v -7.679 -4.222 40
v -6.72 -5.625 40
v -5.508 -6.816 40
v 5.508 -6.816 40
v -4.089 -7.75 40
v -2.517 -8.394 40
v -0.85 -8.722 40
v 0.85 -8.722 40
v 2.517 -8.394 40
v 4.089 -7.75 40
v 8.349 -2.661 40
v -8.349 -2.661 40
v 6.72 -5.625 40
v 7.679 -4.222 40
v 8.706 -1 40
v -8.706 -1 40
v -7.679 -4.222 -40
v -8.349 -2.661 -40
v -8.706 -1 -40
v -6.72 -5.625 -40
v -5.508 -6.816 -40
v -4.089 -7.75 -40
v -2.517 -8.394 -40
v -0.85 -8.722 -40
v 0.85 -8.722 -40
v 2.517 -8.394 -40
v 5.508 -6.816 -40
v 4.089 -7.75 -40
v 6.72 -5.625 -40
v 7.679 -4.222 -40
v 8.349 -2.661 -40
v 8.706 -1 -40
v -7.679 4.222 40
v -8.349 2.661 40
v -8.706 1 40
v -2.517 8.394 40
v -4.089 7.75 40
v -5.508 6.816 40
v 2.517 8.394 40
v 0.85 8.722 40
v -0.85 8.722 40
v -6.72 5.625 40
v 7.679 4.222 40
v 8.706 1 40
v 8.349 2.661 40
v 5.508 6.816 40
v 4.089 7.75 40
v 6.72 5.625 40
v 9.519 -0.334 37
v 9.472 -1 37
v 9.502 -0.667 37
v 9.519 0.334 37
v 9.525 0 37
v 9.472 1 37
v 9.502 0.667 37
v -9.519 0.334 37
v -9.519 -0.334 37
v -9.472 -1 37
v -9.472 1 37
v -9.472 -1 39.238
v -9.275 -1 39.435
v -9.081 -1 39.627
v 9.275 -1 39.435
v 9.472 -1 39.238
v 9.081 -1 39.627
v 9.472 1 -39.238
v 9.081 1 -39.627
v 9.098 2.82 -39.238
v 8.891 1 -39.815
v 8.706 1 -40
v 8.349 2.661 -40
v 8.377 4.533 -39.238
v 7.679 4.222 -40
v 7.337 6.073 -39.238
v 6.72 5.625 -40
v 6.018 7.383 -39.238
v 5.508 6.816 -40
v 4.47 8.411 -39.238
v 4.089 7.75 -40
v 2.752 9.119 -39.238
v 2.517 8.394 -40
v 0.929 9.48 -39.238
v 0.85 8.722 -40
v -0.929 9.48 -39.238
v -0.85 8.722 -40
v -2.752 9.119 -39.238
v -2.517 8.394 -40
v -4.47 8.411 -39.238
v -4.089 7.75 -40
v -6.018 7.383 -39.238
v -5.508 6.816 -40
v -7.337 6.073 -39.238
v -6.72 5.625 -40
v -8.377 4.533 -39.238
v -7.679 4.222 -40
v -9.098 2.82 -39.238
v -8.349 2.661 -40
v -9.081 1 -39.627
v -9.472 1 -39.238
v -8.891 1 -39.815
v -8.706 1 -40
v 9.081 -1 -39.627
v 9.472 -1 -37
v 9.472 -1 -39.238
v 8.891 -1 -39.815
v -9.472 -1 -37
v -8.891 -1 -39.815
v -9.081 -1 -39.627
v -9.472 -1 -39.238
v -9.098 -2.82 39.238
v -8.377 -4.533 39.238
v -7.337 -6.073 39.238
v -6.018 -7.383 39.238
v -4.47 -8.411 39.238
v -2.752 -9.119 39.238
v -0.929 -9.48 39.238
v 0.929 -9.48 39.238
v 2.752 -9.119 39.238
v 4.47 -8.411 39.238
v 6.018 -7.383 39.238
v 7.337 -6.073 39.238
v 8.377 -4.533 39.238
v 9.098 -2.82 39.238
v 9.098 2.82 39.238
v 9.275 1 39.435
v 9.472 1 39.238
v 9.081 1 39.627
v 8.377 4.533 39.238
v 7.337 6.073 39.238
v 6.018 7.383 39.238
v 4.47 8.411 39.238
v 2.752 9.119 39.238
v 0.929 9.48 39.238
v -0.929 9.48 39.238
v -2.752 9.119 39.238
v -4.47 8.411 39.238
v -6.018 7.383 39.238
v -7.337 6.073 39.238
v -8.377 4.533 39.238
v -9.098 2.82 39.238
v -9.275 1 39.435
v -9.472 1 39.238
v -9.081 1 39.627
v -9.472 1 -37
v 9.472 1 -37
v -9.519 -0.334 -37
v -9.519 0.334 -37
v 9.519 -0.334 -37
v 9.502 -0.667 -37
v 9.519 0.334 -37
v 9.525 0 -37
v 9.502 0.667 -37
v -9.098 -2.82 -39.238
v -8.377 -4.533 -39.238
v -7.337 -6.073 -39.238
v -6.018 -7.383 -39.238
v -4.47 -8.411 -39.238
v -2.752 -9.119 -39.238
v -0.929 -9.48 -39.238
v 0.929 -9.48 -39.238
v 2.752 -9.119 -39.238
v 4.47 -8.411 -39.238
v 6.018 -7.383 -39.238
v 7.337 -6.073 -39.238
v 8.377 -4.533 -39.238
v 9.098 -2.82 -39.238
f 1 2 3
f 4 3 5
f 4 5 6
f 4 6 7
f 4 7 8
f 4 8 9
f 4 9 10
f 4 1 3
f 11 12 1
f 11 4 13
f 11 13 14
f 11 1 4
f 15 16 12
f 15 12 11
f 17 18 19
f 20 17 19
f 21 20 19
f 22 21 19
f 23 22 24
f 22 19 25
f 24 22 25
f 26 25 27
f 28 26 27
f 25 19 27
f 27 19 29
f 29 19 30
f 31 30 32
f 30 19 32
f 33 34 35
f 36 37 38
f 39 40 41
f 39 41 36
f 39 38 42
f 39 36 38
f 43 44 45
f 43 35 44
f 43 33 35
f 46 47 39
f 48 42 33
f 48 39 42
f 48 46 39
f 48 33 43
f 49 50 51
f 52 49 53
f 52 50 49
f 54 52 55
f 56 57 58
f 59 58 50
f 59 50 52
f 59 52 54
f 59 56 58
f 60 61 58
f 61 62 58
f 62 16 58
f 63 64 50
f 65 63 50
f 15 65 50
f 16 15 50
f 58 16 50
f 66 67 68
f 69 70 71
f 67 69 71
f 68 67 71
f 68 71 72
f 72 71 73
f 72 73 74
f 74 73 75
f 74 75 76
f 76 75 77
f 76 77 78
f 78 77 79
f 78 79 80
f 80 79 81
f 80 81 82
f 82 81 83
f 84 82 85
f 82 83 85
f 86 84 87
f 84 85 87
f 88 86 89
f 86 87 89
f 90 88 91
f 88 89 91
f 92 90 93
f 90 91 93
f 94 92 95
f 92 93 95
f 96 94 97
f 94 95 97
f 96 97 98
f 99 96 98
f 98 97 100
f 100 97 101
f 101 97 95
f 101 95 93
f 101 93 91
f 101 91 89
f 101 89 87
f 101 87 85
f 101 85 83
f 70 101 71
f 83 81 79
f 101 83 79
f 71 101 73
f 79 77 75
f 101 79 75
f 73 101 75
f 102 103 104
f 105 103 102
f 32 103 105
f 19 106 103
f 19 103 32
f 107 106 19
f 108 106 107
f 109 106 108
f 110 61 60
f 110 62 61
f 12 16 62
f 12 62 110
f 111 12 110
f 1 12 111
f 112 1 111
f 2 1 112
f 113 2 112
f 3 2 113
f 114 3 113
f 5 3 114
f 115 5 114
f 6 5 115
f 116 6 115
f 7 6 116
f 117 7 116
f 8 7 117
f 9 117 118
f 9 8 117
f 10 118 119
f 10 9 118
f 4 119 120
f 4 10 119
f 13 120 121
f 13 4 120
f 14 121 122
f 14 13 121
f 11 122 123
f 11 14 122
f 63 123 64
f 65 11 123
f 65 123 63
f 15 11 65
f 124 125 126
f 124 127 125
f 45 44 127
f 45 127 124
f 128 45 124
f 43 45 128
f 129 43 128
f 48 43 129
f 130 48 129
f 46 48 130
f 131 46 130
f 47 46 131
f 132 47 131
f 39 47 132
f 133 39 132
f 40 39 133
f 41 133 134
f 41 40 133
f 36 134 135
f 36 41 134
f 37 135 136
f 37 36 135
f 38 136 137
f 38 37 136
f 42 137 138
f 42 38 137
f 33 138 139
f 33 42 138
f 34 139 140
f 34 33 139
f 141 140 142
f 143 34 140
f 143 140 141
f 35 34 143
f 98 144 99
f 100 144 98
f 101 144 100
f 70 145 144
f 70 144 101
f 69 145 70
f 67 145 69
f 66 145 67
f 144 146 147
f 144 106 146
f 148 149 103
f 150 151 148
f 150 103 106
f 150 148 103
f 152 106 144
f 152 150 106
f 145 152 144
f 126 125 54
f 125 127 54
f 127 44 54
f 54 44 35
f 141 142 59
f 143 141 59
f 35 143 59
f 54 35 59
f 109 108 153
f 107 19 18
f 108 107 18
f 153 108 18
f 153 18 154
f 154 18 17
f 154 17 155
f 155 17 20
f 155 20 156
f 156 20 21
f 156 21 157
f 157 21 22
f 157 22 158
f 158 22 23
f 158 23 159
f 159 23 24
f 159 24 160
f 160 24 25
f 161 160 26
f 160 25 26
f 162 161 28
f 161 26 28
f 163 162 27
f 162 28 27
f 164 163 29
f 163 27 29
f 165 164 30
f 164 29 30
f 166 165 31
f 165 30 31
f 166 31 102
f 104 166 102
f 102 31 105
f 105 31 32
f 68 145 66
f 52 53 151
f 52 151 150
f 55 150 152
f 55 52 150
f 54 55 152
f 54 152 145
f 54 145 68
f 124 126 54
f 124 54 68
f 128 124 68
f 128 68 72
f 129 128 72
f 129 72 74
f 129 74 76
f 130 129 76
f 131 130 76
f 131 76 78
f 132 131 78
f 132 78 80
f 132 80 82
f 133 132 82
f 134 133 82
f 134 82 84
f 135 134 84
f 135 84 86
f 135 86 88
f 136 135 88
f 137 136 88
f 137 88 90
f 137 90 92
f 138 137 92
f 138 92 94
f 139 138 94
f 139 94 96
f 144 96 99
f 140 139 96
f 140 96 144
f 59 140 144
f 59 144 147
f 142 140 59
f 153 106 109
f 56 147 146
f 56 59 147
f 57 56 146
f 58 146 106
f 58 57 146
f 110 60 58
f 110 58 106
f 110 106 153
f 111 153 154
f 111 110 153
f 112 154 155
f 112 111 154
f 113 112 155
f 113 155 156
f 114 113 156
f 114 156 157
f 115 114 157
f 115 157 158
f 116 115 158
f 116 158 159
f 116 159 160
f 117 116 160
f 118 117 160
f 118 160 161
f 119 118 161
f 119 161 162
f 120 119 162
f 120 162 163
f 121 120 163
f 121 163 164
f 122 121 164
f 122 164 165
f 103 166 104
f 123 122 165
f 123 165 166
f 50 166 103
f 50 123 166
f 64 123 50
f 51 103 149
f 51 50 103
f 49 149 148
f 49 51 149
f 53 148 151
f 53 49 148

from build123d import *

# Parameters (mm, degrees)
SKETCH1_R               = 9.525
BOSS_EXTRUDE1_DEPTH     = 40
CHAMFER1_SIZE           = 0.762
SKETCH2_W               = 3
SKETCH2_H               = 2
CUT_EXTRUDE1_DEPTH      = 10.525
CUT_EXTRUDE1_DEPTH_BACK = 10.525


with BuildPart() as part:
    # Sketch1 → Boss-Extrude1 (new body, symmetric)
    with BuildSketch(Plane.XY):
        Circle(SKETCH1_R)
    extrude(amount=BOSS_EXTRUDE1_DEPTH, both=True)

    # Chamfer1
    chamfer1_edges = [part.edges().sort_by_distance(p)[0] for p in [
        (-9.525, 0, -40),
        (-9.525, 0, 40),
    ]]
    chamfer(chamfer1_edges, length=CHAMFER1_SIZE)

    # Sketch2 → Cut-Extrude1 (cut, two sides)
    with BuildSketch(Plane(origin=(0, 0, 0), x_dir=(0, 0, -1), z_dir=(1, 0, 0))) as cut_extrude1_sk:
        with Locations((-38.5, 0)):
            Rectangle(SKETCH2_W, SKETCH2_H)
        with Locations((38.5, 0)):
            Rectangle(SKETCH2_W, SKETCH2_H)
    extrude(amount=CUT_EXTRUDE1_DEPTH, mode=Mode.SUBTRACT)
    extrude(cut_extrude1_sk.sketch, amount=-CUT_EXTRUDE1_DEPTH_BACK, mode=Mode.SUBTRACT)


solid = part.part
